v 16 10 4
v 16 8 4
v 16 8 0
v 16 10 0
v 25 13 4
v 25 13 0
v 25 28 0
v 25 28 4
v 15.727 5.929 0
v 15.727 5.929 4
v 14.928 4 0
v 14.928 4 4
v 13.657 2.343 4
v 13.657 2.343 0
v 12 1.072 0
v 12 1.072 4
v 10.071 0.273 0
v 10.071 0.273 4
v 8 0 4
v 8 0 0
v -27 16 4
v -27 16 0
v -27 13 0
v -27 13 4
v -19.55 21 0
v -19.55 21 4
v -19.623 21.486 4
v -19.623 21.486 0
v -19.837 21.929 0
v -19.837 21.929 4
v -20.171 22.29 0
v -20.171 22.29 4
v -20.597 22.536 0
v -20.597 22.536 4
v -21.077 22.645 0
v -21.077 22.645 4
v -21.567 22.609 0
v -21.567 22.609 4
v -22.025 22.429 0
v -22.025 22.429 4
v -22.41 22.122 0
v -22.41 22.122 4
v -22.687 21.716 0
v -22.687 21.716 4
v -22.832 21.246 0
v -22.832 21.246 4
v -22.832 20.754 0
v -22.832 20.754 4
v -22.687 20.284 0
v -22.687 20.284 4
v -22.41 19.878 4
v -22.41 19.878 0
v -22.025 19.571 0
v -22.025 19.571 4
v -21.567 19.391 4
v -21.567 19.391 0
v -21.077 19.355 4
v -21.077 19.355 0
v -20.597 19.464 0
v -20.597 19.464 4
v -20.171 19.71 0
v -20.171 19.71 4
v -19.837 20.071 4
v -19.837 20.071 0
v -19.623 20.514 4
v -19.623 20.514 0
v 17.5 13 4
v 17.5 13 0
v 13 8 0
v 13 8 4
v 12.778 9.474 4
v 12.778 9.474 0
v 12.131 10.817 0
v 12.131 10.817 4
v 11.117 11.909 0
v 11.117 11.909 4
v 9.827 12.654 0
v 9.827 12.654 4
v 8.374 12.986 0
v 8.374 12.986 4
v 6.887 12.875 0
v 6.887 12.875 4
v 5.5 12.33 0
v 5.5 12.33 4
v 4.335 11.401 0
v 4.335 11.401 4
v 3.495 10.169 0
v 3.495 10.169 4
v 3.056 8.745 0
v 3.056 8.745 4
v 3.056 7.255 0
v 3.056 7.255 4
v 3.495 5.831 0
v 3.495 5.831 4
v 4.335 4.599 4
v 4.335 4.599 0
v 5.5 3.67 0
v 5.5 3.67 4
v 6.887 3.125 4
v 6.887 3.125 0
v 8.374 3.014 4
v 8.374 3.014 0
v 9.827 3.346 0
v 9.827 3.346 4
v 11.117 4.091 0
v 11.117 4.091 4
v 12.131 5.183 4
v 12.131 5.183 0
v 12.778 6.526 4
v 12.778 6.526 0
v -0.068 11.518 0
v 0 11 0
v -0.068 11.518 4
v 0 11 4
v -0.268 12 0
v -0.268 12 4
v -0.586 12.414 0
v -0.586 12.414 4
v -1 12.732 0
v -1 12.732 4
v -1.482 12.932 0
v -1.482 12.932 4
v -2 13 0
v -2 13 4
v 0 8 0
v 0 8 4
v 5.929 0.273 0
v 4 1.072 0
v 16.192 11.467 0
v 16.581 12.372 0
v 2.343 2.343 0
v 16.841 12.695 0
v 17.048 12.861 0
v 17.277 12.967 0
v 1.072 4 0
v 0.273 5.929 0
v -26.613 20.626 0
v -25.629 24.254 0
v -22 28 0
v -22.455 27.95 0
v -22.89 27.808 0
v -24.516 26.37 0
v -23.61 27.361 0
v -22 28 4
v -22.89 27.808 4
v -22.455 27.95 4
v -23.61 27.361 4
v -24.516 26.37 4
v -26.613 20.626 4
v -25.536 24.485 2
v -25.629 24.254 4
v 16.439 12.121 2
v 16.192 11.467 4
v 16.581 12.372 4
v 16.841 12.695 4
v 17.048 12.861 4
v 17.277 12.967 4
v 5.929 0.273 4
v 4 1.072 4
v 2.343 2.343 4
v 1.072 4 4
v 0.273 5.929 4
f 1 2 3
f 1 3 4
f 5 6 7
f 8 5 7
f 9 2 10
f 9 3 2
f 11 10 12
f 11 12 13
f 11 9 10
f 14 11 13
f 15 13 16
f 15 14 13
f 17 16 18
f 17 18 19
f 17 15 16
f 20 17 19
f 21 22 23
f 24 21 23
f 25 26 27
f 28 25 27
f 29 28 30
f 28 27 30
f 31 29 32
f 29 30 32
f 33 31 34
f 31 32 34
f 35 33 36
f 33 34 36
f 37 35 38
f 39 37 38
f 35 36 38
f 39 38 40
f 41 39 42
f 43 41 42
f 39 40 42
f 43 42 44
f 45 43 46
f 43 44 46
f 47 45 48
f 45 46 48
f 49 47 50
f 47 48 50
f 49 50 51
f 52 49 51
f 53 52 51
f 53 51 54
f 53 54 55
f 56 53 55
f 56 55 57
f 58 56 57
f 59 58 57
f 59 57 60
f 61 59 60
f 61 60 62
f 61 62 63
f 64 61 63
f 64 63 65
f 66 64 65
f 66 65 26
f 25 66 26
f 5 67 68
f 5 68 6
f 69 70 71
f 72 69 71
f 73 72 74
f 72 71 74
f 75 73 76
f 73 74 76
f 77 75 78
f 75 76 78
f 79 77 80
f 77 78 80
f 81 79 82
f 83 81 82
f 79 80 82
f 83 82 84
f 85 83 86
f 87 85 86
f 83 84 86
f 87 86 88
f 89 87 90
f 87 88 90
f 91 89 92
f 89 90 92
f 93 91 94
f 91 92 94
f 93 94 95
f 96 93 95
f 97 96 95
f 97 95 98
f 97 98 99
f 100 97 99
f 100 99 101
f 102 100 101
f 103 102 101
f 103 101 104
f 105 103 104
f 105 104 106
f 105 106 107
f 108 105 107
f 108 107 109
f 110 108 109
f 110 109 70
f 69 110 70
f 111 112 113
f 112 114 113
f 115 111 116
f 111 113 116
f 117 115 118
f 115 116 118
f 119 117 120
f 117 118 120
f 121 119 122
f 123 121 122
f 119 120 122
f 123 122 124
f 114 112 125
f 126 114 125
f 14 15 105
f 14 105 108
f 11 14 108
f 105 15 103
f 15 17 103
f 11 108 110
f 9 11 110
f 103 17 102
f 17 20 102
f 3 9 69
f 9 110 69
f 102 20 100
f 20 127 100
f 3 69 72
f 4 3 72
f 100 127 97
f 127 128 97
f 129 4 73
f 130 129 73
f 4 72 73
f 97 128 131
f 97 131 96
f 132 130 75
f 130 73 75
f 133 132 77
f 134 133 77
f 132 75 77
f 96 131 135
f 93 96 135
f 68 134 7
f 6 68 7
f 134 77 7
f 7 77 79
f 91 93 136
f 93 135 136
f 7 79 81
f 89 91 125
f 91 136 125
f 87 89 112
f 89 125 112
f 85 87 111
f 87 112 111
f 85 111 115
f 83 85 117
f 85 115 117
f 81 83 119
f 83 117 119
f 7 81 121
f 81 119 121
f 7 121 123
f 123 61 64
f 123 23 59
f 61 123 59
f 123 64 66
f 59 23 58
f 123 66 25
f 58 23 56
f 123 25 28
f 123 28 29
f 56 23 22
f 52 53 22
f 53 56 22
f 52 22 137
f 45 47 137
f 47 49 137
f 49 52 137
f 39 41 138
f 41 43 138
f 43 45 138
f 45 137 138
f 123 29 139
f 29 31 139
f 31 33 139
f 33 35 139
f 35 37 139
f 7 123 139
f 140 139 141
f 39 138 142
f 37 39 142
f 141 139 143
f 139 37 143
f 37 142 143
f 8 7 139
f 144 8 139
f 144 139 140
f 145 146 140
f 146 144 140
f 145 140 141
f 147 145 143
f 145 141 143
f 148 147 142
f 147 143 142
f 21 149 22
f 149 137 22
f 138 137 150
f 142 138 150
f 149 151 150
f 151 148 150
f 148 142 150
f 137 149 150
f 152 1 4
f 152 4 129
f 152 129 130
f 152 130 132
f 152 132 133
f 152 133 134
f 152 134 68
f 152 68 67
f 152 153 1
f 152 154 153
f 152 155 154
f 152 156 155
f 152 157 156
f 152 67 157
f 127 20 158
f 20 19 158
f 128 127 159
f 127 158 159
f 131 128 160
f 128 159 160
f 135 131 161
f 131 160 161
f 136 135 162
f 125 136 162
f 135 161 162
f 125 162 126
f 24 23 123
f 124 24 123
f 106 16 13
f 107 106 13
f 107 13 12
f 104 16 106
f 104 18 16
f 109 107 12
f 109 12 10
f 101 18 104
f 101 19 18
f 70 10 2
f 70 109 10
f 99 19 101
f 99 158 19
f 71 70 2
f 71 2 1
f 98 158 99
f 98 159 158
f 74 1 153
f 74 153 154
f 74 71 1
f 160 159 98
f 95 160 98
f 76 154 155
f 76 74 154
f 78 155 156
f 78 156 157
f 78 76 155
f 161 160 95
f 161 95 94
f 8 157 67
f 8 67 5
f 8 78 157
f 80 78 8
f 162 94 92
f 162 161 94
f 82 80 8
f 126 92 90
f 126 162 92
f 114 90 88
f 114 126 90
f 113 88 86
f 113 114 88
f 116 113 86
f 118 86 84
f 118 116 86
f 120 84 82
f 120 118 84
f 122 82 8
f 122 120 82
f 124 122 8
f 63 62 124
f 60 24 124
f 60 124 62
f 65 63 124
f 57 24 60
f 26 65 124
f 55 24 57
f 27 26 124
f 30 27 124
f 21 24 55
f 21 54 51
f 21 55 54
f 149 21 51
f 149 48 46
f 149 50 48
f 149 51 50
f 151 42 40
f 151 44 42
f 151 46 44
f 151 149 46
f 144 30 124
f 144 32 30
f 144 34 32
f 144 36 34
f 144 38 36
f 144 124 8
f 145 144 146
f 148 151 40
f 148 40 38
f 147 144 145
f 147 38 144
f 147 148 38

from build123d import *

# Parameters (mm, degrees)
RESSALTO_EXTRUS_O1_DEPTH = 4
FILETE3_R                = 8
ESBO_O2_R                = 1.65
ESBO_O2_R_2              = 5
CORTE_EXTRUS_O1_DEPTH    = 40.102429592
FILETE12_SIZE            = 5
FILETE12_SIZE_2          = 12
FILETE14_R               = 2
ESBO_O3_W                = 9
ESBO_O3_H                = 13
CORTE_EXTRUS_O2_DEPTH    = 40.102429743
FILETE15_R               = 8
FILETE16_SIZE            = 3
FILETE16_SIZE_2          = 1.5


# Some blends are built 0.0001 mm under size
with BuildPart() as part:
    # Esboço1 → Ressalto-extrusão1 (new body)
    with BuildSketch(Plane.XY):
        Polygon((0, 0), (25, 0), (25, 28), (-27, 28), (-27, 13), (0, 13), align=None)
    extrude(amount=RESSALTO_EXTRUS_O1_DEPTH)

    # Filete3
    filete3_edges = [part.edges().sort_by_distance(p)[0] for p in [
        (0, 0, 2),
    ]]
    fillet(filete3_edges, radius=FILETE3_R)

    # Esboço2 → Corte-extrusão1 (cut, through all)
    with BuildSketch(Plane.XY.offset(4)):
        with Locations((-21.2, 21)):
            Circle(ESBO_O2_R)
        with Locations((8, 8)):
            Circle(ESBO_O2_R_2)
    extrude(amount=-CORTE_EXTRUS_O1_DEPTH, mode=Mode.SUBTRACT)

    # Filete12
    # an asymmetric fillet: 12, 5 mm, written as the material it takes off along each edge
    with BuildSketch(Plane(origin=(-27, 28, -30), x_dir=(1, 0, 0), z_dir=(0, 0, 1))) as filete12_piece_1:
        with BuildLine():
            Bezier((FILETE12_SIZE, 0), (0, 0), (0, -FILETE12_SIZE_2), weights=[1, 0.707106781, 1])
            Line((0, -FILETE12_SIZE_2), (0, 0))
            Line((0, 0), (FILETE12_SIZE, 0))
        make_face()
    extrude(amount=64, mode=Mode.SUBTRACT)

    # Filete14
    filete14_edges = [part.edges().sort_by_distance(p)[0] for p in [
        (0, 13, 2),
    ]]
    fillet(filete14_edges, radius=FILETE14_R)

    # Esboço3 → Corte-extrusão2 (cut, through all)
    with BuildSketch(Plane.XY.offset(4)):
        with Locations((20.5, 6.5)):
            Rectangle(ESBO_O3_W, ESBO_O3_H)
    extrude(amount=-CORTE_EXTRUS_O2_DEPTH, mode=Mode.SUBTRACT)

    # Filete15
    filete15_edges = [part.edges().sort_by_distance(p)[0] for p in [
        (16, 0, 2),
    ]]
    fillet(filete15_edges, radius=FILETE15_R - 0.0001)  # a hair under: the kernel refuses the full size

    # Filete16
    # an asymmetric fillet: 3, 1.5 mm, written as the material it adds along each edge
    with BuildSketch(Plane(origin=(16, 13, 4), x_dir=(0, -1, 0), z_dir=(0, 0, -1))) as filete16_piece_1:
        with BuildLine():
            Bezier((FILETE16_SIZE, 0), (0, 0), (0, -FILETE16_SIZE_2), weights=[1, 0.707106781, 1])
            Line((0, -FILETE16_SIZE_2), (0, 0))
            Line((0, 0), (FILETE16_SIZE, 0))
        make_face()
    extrude(amount=4)


solid = part.part
